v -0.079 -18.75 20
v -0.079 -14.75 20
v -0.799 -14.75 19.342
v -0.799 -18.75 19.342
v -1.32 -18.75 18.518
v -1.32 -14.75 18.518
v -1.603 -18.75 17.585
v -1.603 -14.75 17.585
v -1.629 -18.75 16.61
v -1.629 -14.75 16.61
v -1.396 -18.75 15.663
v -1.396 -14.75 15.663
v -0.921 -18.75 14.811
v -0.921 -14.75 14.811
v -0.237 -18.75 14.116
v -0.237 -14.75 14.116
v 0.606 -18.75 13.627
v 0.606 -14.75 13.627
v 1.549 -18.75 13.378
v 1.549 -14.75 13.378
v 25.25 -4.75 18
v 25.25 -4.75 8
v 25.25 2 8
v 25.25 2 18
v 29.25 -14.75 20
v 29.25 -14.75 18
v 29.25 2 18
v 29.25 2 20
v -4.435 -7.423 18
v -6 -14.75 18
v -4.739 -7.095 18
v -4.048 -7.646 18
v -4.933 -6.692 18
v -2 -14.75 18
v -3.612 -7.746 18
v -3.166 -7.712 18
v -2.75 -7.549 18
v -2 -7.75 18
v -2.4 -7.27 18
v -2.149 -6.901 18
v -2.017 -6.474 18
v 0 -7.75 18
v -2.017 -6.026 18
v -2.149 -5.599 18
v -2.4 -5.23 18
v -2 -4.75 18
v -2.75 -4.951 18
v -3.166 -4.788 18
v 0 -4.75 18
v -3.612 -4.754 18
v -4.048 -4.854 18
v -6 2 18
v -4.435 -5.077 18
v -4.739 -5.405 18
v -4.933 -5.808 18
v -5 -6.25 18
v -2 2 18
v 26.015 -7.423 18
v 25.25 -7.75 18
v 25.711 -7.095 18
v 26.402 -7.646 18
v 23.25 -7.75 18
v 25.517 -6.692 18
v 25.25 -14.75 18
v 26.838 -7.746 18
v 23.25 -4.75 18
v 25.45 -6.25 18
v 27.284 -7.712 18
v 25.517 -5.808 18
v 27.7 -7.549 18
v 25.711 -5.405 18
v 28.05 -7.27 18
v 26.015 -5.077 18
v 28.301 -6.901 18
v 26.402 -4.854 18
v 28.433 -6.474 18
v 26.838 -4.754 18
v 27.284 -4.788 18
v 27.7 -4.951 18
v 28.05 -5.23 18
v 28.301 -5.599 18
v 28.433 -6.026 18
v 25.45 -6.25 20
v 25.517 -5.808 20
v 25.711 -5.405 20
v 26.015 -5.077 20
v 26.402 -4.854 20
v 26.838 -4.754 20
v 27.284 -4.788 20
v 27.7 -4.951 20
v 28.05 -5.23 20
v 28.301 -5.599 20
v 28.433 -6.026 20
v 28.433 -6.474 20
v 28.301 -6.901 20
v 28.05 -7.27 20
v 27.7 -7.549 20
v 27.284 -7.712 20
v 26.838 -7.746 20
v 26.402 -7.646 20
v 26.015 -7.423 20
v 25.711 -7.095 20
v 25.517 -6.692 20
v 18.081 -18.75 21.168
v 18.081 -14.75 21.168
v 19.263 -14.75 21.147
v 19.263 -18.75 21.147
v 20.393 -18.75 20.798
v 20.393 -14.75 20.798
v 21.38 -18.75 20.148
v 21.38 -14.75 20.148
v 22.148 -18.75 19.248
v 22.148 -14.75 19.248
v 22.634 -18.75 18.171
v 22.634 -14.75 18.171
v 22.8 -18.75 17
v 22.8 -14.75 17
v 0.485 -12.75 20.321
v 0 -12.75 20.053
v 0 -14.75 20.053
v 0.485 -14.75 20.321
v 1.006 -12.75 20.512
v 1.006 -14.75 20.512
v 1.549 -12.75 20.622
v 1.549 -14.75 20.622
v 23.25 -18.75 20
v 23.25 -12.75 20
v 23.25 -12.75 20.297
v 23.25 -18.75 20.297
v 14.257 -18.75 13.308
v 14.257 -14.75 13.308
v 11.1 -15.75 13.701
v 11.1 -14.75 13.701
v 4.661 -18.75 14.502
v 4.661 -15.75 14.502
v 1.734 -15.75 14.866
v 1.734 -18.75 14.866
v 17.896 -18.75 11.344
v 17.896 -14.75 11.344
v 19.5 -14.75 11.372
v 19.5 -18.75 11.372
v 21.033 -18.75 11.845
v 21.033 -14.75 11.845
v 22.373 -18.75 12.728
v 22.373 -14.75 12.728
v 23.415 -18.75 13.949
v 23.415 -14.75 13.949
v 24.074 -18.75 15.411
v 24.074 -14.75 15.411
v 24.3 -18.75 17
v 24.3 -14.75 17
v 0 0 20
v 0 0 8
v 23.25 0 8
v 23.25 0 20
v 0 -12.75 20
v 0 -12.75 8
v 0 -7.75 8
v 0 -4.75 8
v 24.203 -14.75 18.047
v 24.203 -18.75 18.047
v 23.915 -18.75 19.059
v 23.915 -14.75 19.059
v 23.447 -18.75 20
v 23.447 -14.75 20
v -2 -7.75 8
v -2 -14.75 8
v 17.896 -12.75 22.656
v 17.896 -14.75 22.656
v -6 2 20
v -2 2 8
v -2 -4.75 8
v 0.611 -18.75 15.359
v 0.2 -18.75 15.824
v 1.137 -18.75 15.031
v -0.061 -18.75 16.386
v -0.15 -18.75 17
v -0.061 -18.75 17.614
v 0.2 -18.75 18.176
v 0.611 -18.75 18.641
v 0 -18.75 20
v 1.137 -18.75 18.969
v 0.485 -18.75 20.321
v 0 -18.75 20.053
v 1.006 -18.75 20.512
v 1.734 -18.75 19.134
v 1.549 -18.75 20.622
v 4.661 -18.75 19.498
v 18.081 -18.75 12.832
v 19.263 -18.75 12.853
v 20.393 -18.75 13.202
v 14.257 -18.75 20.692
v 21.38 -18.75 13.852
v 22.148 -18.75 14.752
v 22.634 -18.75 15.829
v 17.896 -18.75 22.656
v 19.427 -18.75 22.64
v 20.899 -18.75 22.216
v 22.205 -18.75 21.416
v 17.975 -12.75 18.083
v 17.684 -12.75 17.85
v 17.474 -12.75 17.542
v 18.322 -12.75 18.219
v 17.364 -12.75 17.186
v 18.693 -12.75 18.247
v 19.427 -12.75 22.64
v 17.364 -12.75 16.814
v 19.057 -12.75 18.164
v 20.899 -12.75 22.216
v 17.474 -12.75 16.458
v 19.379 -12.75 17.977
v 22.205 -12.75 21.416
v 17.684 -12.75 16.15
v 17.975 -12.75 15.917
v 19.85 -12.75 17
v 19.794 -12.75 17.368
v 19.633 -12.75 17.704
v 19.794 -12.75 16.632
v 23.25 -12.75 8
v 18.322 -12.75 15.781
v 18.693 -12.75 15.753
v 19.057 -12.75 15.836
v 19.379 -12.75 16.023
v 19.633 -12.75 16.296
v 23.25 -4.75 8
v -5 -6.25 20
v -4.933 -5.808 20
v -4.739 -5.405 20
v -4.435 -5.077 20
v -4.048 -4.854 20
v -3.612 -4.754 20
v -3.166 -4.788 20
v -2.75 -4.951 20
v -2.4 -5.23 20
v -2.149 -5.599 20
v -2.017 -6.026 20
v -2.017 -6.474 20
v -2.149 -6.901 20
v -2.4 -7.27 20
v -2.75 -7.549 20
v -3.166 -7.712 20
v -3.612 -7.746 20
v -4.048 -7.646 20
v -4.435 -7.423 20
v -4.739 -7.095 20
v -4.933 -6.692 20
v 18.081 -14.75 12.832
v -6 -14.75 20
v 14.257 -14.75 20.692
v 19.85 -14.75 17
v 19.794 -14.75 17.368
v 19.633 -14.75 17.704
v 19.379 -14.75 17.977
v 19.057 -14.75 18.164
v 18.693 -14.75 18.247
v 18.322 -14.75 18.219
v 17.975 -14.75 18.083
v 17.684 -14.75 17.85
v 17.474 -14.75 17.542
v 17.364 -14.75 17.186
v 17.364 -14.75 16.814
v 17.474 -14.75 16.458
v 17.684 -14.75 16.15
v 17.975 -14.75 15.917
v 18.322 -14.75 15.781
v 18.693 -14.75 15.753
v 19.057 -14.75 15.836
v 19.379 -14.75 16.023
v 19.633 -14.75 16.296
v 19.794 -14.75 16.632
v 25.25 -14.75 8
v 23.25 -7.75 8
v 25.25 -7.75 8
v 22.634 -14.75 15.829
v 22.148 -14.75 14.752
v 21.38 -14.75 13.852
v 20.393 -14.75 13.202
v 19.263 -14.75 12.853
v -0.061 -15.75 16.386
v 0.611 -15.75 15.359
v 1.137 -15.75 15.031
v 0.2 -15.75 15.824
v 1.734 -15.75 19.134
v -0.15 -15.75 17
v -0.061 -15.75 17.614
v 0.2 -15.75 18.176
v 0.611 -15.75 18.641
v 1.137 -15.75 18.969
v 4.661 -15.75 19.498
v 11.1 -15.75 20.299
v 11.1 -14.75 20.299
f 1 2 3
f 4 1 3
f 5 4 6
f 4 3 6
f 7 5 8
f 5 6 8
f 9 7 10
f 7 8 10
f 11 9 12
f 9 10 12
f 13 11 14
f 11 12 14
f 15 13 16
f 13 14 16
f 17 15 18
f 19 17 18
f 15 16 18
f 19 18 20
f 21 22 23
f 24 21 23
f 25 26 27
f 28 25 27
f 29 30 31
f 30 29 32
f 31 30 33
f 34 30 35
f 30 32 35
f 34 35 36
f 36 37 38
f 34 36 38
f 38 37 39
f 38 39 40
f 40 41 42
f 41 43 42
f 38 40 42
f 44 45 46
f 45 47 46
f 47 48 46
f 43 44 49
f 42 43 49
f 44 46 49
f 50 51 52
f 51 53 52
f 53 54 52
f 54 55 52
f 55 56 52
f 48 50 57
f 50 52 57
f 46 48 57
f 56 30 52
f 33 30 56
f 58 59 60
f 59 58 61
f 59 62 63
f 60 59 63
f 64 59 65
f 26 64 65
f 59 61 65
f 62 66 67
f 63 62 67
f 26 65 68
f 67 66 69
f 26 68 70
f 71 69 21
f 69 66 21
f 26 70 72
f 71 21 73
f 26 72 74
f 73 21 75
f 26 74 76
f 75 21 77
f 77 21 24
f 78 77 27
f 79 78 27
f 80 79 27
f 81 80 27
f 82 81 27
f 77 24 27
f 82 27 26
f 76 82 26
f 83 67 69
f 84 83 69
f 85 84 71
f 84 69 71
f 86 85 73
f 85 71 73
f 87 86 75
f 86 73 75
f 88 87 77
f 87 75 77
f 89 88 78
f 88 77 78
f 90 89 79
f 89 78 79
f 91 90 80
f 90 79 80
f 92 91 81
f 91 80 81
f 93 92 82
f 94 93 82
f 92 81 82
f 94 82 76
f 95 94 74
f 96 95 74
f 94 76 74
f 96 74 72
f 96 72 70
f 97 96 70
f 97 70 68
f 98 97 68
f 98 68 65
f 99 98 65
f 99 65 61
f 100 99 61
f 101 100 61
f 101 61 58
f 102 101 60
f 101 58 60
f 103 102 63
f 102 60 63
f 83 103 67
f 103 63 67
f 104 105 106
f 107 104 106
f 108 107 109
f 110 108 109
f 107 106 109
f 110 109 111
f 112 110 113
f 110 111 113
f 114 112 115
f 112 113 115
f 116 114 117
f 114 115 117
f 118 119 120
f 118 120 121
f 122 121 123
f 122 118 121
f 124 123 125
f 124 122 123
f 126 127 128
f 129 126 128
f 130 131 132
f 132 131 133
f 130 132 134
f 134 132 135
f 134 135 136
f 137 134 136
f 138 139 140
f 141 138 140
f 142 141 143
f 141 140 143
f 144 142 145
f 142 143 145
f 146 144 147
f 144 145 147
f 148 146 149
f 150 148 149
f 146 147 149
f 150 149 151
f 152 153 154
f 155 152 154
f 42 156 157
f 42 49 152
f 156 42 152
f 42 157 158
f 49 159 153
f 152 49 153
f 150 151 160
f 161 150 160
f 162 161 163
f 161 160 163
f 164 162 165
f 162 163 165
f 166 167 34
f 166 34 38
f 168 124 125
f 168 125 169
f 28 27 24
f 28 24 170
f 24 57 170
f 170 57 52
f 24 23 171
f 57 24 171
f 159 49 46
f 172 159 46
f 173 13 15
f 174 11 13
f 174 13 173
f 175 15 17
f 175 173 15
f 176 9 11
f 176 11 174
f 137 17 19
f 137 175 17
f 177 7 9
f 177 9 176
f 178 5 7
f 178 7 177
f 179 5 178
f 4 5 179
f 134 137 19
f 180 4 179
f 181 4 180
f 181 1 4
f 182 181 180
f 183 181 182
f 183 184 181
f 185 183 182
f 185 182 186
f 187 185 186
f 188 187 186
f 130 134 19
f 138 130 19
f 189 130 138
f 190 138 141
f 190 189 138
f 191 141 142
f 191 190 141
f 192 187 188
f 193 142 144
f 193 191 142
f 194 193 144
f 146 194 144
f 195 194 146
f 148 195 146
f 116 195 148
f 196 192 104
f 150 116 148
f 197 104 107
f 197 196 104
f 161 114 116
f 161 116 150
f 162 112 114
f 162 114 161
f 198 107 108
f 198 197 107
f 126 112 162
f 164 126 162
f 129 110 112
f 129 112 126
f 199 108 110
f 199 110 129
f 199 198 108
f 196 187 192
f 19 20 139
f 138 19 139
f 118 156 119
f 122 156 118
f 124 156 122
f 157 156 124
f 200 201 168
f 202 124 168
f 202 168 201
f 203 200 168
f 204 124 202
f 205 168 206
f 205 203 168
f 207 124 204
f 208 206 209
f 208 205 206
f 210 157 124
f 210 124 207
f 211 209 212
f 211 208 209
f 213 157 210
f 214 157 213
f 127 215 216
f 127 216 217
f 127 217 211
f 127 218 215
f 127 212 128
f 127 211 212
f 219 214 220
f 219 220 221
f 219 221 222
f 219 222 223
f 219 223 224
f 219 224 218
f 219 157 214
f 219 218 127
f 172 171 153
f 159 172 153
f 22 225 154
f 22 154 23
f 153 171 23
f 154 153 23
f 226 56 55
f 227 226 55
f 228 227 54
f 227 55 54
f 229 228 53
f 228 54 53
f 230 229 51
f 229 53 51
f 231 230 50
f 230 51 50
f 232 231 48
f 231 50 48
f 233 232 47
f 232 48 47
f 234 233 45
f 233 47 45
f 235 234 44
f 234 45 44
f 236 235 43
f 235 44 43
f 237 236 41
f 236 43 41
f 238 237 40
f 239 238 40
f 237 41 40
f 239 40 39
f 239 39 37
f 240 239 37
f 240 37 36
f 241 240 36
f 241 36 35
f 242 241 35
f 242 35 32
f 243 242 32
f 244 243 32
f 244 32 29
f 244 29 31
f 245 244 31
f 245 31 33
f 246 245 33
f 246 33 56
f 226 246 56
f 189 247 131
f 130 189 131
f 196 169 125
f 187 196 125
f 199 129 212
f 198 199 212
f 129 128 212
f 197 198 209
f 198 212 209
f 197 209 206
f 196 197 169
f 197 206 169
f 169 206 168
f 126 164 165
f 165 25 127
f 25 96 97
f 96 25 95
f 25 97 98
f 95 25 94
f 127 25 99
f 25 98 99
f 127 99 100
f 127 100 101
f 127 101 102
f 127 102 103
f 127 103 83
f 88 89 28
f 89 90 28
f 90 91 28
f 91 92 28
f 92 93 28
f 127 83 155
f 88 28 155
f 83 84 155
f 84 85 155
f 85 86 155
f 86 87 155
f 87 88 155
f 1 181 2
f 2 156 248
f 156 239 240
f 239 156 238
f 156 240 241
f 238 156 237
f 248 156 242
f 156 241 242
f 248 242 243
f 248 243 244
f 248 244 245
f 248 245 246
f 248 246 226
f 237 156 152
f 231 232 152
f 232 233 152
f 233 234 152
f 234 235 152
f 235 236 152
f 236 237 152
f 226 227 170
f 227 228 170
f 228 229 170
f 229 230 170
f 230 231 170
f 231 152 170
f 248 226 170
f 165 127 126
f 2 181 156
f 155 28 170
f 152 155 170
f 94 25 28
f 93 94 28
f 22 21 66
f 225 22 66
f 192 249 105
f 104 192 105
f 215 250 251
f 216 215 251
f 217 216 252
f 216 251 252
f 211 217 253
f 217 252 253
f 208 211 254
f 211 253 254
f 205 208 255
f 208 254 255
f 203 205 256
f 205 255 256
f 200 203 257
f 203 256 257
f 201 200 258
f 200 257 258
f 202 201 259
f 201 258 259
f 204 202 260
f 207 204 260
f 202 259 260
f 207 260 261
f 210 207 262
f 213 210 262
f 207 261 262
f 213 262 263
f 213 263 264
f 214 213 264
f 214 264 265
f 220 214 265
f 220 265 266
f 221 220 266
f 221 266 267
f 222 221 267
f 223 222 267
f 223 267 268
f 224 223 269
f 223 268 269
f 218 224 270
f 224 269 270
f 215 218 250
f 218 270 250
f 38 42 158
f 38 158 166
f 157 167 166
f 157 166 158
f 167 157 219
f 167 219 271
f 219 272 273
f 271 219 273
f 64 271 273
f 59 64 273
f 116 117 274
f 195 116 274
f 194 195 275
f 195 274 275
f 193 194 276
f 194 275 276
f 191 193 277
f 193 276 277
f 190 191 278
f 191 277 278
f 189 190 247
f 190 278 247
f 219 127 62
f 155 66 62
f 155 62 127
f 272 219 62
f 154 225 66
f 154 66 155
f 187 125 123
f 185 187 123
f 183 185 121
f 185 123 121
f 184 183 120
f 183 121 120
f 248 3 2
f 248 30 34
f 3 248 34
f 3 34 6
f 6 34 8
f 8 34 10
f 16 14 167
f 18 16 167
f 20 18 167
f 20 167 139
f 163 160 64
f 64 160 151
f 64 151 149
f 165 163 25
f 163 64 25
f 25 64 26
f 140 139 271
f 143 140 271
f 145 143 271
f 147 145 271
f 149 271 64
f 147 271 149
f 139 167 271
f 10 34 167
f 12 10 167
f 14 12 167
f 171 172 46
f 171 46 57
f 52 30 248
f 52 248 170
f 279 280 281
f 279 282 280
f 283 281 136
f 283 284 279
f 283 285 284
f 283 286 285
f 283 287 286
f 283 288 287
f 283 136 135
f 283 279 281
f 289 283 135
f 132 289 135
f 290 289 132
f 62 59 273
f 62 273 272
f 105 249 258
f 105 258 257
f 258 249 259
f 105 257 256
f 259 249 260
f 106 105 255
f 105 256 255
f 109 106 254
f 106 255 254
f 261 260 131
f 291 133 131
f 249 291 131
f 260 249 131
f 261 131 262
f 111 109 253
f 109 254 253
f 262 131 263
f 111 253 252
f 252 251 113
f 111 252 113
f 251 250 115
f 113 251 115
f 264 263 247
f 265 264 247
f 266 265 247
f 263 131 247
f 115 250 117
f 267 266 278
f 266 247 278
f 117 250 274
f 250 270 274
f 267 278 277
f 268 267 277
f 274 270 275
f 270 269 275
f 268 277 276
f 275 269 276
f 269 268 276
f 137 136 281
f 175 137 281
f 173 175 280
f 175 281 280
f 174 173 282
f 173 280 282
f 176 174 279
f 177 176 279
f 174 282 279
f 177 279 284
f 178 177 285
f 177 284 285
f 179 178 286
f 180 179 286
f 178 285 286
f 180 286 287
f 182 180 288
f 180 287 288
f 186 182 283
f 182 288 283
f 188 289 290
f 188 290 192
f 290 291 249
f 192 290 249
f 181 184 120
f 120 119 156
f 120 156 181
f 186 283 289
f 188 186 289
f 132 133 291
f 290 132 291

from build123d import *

# Parameters (mm, degrees)
SKETCH1_W           = 27.25
SKETCH1_H           = 16.75
SKETCH1_W_2         = 23.25
SKETCH1_H_2         = 12.75
BOSS_EXTRUDE1_DEPTH = 18
SKETCH3_W           = 23.25
SKETCH3_H           = 12.75
BOSS_EXTRUDE2_DEPTH = 2
SKETCH7_W           = 2
SKETCH7_H           = 5
CUT_EXTRUDE1_DEPTH  = 2
SKETCH10_W          = 23.25
SKETCH10_H          = 12.75
SKETCH10_W_2        = 7
SKETCH10_H_2        = 16.75
BOSS_EXTRUDE3_DEPTH = 2
SKETCH11_R          = 1.5
CUT_EXTRUDE3_DEPTH  = 2
SKETCH12_R          = 1.5
CUT_EXTRUDE4_DEPTH  = 2
FILLET11_R          = 1
SKETCH13_W          = 3
SKETCH13_H          = 16.75
CUT_EXTRUDE5_DEPTH  = 10
CUT_EXTRUDE6_REACH  = 41.193
SKETCH14_W          = 27.25
SKETCH14_H          = 8
SKETCH16_W          = 23.25
SKETCH16_H          = 2
BOSS_EXTRUDE5_DEPTH = 7.6
SKETCH19_W          = 2
SKETCH19_H          = 3
CUT_EXTRUDE8_DEPTH  = 10
BOSS_EXTRUDE6_DEPTH = 4
SKETCH21_R          = 1.25
CUT_EXTRUDE9_DEPTH  = 2
BOSS_EXTRUDE7_DEPTH = 1
CUT_EXTRUDE11_START = -12
CUT_EXTRUDE11_DEPTH = 12


with BuildPart() as part:
    # Sketch1 → Boss-Extrude1 (new body)
    with BuildSketch(Plane.XY):
        with Locations((11.625, -6.375)):
            Rectangle(SKETCH1_W, SKETCH1_H)
        with Locations((11.625, -6.375)):
            Rectangle(SKETCH1_W_2, SKETCH1_H_2, mode=Mode.SUBTRACT)
    extrude(amount=BOSS_EXTRUDE1_DEPTH)

    # Sketch3 → Boss-Extrude2 (add)
    with BuildSketch(Plane(origin=(0, 0, 0), x_dir=(-1, 0, 0), z_dir=(0, 0, -1))):
        with Locations((-11.625, -6.375)):
            Rectangle(SKETCH3_W, SKETCH3_H)
    extrude(amount=-BOSS_EXTRUDE2_DEPTH)

    # Sketch7 → Cut-Extrude1 (cut)
    with BuildSketch(Plane.ZY.offset(2)):
        with Locations((3, -6.5)):
            Rectangle(SKETCH7_W, SKETCH7_H)
    extrude(amount=-CUT_EXTRUDE1_DEPTH, mode=Mode.SUBTRACT)

    # Sketch10 → Boss-Extrude3 (add)
    # profile 1 of 3: a face of its own
    with BuildSketch(Plane.XY.offset(18)):
        Polygon((-2, -0.03961342), (-2, 2), (-9, 2), (-9, -14.75), (-2, -14.75), (-2, -13.03961342), align=None)
    # profile 2 of 3: a face of its own
    with BuildSketch(Plane.XY.offset(18)):
        Polygon((25.25, 2), (-2, 2), (-2, -0.03961342), (-2, -13.03961342), (-2, -14.75), (25.25, -14.75), align=None)
        with Locations((11.625, -6.375)):
            Rectangle(SKETCH10_W, SKETCH10_H, mode=Mode.SUBTRACT)
    # profile 3 of 3: a face of its own
    with BuildSketch(Plane.XY.offset(18)):
        with Locations((28.75, -6.375)):
            Rectangle(SKETCH10_W_2, SKETCH10_H_2)
    extrude(amount=BOSS_EXTRUDE3_DEPTH)

    # Sketch11 → Cut-Extrude3 (cut)
    with BuildSketch(Plane(origin=(0, 0, 18), x_dir=(-1, 0, 0), z_dir=(0, 0, -1))):
        with Locations((3.5, -6.25)):
            Circle(SKETCH11_R)
    extrude(amount=-CUT_EXTRUDE3_DEPTH, mode=Mode.SUBTRACT)

    # Sketch12 → Cut-Extrude4 (cut)
    with BuildSketch(Plane(origin=(0, 0, 18), x_dir=(-1, 0, 0), z_dir=(0, 0, -1))):
        with Locations((-26.95, -6.25)):
            Circle(SKETCH12_R)
    extrude(amount=-CUT_EXTRUDE4_DEPTH, mode=Mode.SUBTRACT)

    # Fillet11
    fillet11_edges = [part.edges().sort_by_distance(p)[0] for p in [
        (0, -9, 3),
        (0, -4, 3),
        (0, -6.5, 4),
        (-2, -6.5, 4),
        (-2, -4, 3),
        (-2, -9, 3),
    ]]
    fillet(fillet11_edges, radius=FILLET11_R - 0.0001)  # a hair under: the kernel refuses the full size

    # Sketch13 → Cut-Extrude5 (cut)
    with BuildSketch(Plane(origin=(0, 0, 18), x_dir=(-1, 0, 0), z_dir=(0, 0, -1))):
        with Locations((-30.75, -6.375)):
            Rectangle(SKETCH13_W, SKETCH13_H)
        with Locations((7.5, -6.375)):
            Rectangle(SKETCH13_W, SKETCH13_H)
    extrude(amount=-CUT_EXTRUDE5_DEPTH, mode=Mode.SUBTRACT)

    # Cut-Extrude6: up to this face of the body (flat: up to its plane)
    cut_extrude6_end = Plane(part.part.faces().sort_by_distance((11.625, -14.75, 10.256684492))[0])
    # Sketch14 → Cut-Extrude6 (cut, up to the picked face)
    with BuildSketch(Plane(origin=(0, 2, 0), x_dir=(1, 0, 0), z_dir=(0, 1, 0)), mode=Mode.PRIVATE) as cut_extrude6_sk1:
        with Locations((11.625, -4)):
            Rectangle(SKETCH14_W, SKETCH14_H)
    cut_extrude6_tool1 = split(extrude(cut_extrude6_sk1.sketch, amount=-CUT_EXTRUDE6_REACH, mode=Mode.PRIVATE), bisect_by=cut_extrude6_end, keep=Keep.BOTH, mode=Mode.PRIVATE)
    add(cut_extrude6_tool1.solids().sort_by(Axis((11.625, 2, 4), (0, -1, 0)))[0], mode=Mode.SUBTRACT)

    # Sketch16 → Boss-Extrude5 (add)
    with BuildSketch(Plane.XY.offset(20)):
        with Locations((11.625, -13.75)):
            Rectangle(SKETCH16_W, SKETCH16_H)
    extrude(amount=BOSS_EXTRUDE5_DEPTH)

    # Sketch19 → Cut-Extrude8 (cut)
    with BuildSketch(Plane(origin=(0, 0, 8), x_dir=(-1, 0, 0), z_dir=(0, 0, -1))):
        with Locations((1, -6.25)):
            Rectangle(SKETCH19_W, SKETCH19_H)
        with Locations((-24.25, -6.25)):
            Rectangle(SKETCH19_W, SKETCH19_H)
    extrude(amount=-CUT_EXTRUDE8_DEPTH, mode=Mode.SUBTRACT)

    # Sketch20 → Boss-Extrude6 (add)
    with BuildSketch(Plane.XZ.offset(14.75)):
        with BuildLine():
            ThreePointArc((1.734487906, 14.866457564), (-0.15, 17.000000025), (1.734487955, 19.133542442))
            Line((1.734487955, 19.133542442), (4.661486136, 19.497797339))
            ThreePointArc((4.661486136, 19.497797339), (3.240091566, 20.432881138), (1.549246975, 20.622060423))
            ThreePointArc((1.549246975, 20.622060423), (0.742054746, 20.4263791), (0, 20.053276928))
            Line((0, 20.053276928), (0, 20))
            Line((0, 20), (-0.079062289, 20))
            ThreePointArc((-0.079062289, 20), (-1.544419903, 16.128456799), (1.549246968, 13.377939578))
            ThreePointArc((1.549246968, 13.377939578), (3.240091563, 13.567118861), (4.661486136, 14.502202661))
            Line((4.661486136, 14.502202661), (1.734487906, 14.866457564))
        make_face()
        with BuildLine():
            ThreePointArc((1.549246975, 20.622060423), (3.240091566, 20.432881138), (4.661486136, 19.497797339))
            Line((4.661486136, 19.497797339), (14.257253364, 20.691957699))
            ThreePointArc((14.257253364, 20.691957699), (15.89224684, 22.015782374), (17.896084422, 22.656368345))
            Line((17.896084422, 22.656368345), (1.549246975, 20.622060423))
        make_face()
        with BuildLine():
            ThreePointArc((17.896084422, 22.656368345), (15.89224684, 22.015782374), (14.257253364, 20.691957699))
            Line((14.257253364, 20.691957699), (18.081325153, 21.167850334))
            ThreePointArc((18.081325153, 21.167850334), (21.380428532, 20.14789091), (22.8, 17))
            ThreePointArc((22.8, 17), (21.380428595, 13.852109147), (18.081325321, 12.832149645))
            Line((18.081325321, 12.832149645), (14.257253364, 13.308042301))
            ThreePointArc((14.257253364, 13.308042301), (15.89224684, 11.984217626), (17.896084422, 11.343631655))
            ThreePointArc((17.896084422, 11.343631655), (22.37343883, 12.727862432), (24.3, 17))
            ThreePointArc((24.3, 17), (24.082512903, 18.559503854), (23.446648326, 20))
            Line((23.446648326, 20), (23.25, 20))
            Line((23.25, 20), (23.25, 20.296589146))
            ThreePointArc((23.25, 20.296589146), (20.898920406, 22.215837897), (17.896084422, 22.656368345))
        make_face()
        with BuildLine():
            Line((14.257253364, 13.308042301), (4.661486136, 14.502202661))
            ThreePointArc((4.661486136, 14.502202661), (3.240091563, 13.567118861), (1.549246968, 13.377939578))
            Line((1.549246968, 13.377939578), (17.896084422, 11.343631655))
            ThreePointArc((17.896084422, 11.343631655), (15.89224684, 11.984217626), (14.257253364, 13.308042301))
        make_face()
    extrude(amount=BOSS_EXTRUDE6_DEPTH)

    # Sketch21 → Cut-Extrude9 (cut)
    with BuildSketch(Plane.XZ.offset(14.75)):
        with Locations((18.6, 17)):
            Circle(SKETCH21_R)
    extrude(amount=-CUT_EXTRUDE9_DEPTH, mode=Mode.SUBTRACT)

    # Sketch23 → Boss-Extrude7 (add)
    with BuildSketch(Plane.XZ.offset(14.75)):
        Polygon((11.1, 21.100651295), (0.406174607, 19.998863224), (-0.954500861, 17.320033397), (0.387681288, 14.425953139), (11.1, 12.86779769), align=None)
    extrude(amount=BOSS_EXTRUDE7_DEPTH)

    # Sketch24 → Cut-Extrude11 (cut)
    with BuildSketch(Plane.XZ.offset(14.75).offset(CUT_EXTRUDE11_START)):
        with BuildLine():
            ThreePointArc((0, 20.053276928), (0.742054739, 20.426379098), (1.549246961, 20.622060422))
            Line((1.549246961, 20.622060422), (17.896084422, 22.656368345))
            ThreePointArc((17.896084422, 22.656368345), (20.898920406, 22.215837897), (23.25, 20.296589146))
            Line((23.25, 20.296589146), (23.25, 27.6))
            Line((23.25, 27.6), (0, 27.6))
            Line((0, 27.6), (0, 20.053276928))
        make_face()
    extrude(amount=CUT_EXTRUDE11_DEPTH, mode=Mode.SUBTRACT)


solid = part.part
